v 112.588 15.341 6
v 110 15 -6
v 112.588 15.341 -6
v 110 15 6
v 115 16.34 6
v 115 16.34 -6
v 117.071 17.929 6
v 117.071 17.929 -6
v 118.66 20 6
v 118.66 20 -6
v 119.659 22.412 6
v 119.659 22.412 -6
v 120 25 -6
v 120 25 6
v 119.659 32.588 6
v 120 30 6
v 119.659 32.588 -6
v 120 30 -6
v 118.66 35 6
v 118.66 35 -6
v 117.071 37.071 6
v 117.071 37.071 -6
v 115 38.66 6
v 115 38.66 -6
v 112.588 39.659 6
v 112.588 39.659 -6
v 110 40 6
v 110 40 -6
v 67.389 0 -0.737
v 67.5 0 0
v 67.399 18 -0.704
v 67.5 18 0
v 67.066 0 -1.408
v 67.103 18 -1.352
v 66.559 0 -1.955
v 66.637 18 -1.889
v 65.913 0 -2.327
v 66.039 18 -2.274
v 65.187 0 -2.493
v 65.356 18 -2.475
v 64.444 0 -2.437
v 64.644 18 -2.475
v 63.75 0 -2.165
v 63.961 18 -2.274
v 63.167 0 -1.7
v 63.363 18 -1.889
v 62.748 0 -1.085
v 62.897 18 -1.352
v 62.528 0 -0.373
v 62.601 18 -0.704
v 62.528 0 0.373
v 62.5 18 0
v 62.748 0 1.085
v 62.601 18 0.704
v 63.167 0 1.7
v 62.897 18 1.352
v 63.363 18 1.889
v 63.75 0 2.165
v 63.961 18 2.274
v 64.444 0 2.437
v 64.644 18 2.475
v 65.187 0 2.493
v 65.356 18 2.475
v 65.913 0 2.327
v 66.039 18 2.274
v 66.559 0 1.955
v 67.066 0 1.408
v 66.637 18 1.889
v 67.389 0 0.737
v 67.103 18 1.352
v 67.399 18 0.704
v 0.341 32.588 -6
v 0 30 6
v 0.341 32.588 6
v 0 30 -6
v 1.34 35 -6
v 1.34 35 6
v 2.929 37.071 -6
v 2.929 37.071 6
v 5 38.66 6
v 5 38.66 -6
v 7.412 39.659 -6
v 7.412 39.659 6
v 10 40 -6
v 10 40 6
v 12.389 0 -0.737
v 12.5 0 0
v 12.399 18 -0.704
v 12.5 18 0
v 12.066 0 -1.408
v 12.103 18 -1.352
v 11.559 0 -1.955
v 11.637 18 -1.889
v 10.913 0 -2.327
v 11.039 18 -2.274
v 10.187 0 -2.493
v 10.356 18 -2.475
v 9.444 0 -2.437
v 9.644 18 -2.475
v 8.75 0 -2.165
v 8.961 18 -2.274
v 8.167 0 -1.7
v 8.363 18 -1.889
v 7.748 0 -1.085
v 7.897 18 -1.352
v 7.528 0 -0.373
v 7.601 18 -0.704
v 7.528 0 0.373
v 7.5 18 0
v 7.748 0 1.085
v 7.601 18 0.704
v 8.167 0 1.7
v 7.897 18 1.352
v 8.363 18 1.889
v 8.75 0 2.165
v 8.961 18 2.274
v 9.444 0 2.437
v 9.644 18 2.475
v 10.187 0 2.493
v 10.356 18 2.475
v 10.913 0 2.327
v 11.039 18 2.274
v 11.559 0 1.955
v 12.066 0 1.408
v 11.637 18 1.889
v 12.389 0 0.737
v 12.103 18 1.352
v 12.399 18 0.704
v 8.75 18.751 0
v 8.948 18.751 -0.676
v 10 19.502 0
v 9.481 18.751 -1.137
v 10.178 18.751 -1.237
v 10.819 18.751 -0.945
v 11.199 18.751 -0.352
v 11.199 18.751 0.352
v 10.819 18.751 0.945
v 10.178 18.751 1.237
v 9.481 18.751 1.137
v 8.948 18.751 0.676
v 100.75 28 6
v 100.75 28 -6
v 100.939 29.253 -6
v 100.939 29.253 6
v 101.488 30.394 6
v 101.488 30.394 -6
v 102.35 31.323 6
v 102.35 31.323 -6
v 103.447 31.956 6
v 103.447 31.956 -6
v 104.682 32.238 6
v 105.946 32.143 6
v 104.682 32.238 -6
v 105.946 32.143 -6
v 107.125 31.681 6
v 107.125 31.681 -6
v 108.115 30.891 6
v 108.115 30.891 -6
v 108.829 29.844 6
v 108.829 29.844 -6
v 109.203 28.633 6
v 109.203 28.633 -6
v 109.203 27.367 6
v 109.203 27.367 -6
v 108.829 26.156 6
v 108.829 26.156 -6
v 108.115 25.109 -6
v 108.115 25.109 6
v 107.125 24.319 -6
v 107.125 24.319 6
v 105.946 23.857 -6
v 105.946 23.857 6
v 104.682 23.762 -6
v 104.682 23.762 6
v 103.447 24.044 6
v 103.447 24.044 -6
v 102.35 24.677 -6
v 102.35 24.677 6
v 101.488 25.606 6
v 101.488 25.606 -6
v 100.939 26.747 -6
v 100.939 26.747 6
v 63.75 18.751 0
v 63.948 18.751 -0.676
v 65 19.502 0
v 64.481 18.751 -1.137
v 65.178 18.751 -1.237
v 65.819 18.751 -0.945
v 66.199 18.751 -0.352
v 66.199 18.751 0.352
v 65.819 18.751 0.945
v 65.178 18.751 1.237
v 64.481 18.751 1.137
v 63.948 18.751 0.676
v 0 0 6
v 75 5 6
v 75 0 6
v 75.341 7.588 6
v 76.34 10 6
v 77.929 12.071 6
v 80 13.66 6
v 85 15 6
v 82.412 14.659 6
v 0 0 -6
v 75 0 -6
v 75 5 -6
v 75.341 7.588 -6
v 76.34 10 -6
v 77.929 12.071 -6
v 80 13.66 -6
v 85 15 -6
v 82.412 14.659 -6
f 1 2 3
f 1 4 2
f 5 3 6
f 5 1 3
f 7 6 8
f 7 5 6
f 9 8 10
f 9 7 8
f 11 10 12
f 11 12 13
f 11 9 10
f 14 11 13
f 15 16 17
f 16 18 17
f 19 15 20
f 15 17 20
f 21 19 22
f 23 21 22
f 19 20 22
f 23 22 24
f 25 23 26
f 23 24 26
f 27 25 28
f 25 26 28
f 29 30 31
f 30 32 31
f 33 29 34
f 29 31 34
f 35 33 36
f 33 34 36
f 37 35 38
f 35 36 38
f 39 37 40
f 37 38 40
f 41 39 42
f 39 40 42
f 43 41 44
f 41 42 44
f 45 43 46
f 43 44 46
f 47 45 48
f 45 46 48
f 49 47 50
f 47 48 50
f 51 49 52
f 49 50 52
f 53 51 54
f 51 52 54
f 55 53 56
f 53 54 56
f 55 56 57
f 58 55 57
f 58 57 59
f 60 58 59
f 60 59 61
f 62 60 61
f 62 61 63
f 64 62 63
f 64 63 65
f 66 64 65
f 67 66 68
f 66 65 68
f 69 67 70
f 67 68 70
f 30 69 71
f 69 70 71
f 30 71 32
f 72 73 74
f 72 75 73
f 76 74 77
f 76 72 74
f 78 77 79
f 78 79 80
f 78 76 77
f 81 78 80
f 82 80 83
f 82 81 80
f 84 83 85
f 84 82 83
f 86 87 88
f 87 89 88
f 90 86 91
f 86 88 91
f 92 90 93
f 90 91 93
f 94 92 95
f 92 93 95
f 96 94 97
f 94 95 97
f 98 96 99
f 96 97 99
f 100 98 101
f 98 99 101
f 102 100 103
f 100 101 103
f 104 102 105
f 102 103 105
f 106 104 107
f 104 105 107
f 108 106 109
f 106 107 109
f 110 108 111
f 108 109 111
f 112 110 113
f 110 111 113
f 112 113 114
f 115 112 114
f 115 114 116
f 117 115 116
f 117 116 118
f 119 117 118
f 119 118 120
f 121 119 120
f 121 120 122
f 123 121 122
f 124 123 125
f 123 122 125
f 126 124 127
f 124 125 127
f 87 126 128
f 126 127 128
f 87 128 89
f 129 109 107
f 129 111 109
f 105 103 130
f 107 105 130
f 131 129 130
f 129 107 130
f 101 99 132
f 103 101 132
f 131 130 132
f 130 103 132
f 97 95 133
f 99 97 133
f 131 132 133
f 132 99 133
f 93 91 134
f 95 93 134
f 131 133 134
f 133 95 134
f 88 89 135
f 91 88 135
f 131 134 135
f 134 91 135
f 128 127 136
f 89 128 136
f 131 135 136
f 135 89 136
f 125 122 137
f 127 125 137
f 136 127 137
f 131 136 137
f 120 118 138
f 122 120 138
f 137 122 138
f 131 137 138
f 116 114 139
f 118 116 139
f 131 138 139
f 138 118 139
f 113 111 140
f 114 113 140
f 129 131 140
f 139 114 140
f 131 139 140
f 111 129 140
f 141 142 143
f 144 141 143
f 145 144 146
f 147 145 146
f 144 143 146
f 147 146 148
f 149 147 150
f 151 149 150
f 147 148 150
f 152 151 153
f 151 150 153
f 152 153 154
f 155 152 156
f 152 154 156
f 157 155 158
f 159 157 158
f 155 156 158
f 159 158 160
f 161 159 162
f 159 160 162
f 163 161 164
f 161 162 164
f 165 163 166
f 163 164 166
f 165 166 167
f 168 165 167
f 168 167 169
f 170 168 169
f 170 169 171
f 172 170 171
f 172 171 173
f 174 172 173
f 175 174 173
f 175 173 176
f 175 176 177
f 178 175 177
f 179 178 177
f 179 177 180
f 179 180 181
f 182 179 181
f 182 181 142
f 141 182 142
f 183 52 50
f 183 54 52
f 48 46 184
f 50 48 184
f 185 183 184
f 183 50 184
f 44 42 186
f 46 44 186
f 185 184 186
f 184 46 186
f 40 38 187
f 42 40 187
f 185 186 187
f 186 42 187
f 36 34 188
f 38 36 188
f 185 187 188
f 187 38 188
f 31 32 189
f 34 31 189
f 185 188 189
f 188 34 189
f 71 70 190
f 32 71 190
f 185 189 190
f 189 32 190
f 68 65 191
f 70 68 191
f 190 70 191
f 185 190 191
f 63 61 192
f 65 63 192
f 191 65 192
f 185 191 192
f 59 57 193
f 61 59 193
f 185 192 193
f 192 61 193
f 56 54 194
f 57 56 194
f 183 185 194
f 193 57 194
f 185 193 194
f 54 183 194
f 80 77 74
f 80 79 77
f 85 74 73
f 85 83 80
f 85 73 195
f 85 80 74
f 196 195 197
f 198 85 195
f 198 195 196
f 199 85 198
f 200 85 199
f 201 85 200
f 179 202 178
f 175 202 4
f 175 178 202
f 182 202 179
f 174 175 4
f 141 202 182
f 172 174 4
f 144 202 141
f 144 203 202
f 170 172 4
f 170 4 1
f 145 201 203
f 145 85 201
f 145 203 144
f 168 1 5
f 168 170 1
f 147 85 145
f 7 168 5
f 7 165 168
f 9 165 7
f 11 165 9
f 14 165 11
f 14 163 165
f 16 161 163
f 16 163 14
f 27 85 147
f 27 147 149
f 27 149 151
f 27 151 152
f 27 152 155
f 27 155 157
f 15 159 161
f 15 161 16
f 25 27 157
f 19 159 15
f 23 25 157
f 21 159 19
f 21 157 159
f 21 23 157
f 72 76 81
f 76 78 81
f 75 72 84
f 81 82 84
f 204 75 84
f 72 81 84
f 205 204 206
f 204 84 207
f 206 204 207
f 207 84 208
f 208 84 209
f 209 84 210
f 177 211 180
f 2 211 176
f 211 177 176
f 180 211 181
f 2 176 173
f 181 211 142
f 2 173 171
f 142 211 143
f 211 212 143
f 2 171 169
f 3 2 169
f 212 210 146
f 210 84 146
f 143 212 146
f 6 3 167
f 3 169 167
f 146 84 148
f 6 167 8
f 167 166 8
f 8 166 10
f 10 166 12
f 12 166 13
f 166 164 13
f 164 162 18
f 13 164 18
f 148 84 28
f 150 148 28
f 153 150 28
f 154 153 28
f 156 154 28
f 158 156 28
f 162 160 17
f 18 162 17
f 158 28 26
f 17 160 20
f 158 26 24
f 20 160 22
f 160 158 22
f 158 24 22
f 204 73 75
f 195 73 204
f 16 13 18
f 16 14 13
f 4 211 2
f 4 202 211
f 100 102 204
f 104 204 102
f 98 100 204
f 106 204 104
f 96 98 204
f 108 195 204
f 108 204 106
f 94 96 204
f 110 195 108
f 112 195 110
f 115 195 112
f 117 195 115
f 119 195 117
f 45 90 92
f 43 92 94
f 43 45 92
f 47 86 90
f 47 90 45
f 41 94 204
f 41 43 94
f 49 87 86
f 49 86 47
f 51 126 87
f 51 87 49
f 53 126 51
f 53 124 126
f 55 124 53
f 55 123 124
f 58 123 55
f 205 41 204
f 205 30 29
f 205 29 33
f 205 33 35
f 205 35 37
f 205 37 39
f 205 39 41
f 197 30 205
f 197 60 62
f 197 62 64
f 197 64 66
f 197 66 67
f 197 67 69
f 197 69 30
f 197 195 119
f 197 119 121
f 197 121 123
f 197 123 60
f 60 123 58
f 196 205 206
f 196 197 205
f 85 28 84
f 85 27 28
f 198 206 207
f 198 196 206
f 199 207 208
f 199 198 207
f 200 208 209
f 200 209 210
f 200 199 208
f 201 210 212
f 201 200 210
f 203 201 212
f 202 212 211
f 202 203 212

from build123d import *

# Parameters (mm, degrees)
EXTRUDE_1_DEPTH        = 6
HOLE_WIZARD_M6_1_D     = 5
HOLE_WIZARD_M6_1_DEPTH = 18
HOLE_WIZARD_M6_1_TIP   = 1.502151548
FILLET_1_R             = 10
HOLE_WIZARD_M10_1_D    = 8.5


with BuildPart() as part:
    # 草图1 → 凸台-拉伸1 (new body, symmetric)
    with BuildSketch(Plane.XY):
        Polygon((0, 0), (75, 0), (75, 15), (120, 15), (120, 40), (0, 40), align=None)
    extrude(amount=EXTRUDE_1_DEPTH, both=True)

    # M6 螺纹孔1
    with Locations(Plane(origin=(0, 0, 0), x_dir=(-1, 0, 0), z_dir=(0, -1, 0))):
        with Locations((-10, 0), (-65, 0)):
            Hole(HOLE_WIZARD_M6_1_D / 2, depth=HOLE_WIZARD_M6_1_DEPTH)
            with Locations((0, 0, -(HOLE_WIZARD_M6_1_DEPTH + HOLE_WIZARD_M6_1_TIP / 2))):  # 118° drill point
                Cone(0, HOLE_WIZARD_M6_1_D / 2, HOLE_WIZARD_M6_1_TIP, mode=Mode.SUBTRACT)

    # 圆角1
    fillet_1_edges = [part.edges().sort_by_distance(p)[0] for p in [
        (0, 40, 0),
        (120, 40, 0),
        (120, 15, 0),
        (75, 15, 0),
    ]]
    fillet(fillet_1_edges, radius=FILLET_1_R)

    # M10 螺纹孔1 (through all)
    with Locations(Plane.XY.offset(6)):
        with Locations((105, 28)):
            Hole(HOLE_WIZARD_M10_1_D / 2)


solid = part.part
